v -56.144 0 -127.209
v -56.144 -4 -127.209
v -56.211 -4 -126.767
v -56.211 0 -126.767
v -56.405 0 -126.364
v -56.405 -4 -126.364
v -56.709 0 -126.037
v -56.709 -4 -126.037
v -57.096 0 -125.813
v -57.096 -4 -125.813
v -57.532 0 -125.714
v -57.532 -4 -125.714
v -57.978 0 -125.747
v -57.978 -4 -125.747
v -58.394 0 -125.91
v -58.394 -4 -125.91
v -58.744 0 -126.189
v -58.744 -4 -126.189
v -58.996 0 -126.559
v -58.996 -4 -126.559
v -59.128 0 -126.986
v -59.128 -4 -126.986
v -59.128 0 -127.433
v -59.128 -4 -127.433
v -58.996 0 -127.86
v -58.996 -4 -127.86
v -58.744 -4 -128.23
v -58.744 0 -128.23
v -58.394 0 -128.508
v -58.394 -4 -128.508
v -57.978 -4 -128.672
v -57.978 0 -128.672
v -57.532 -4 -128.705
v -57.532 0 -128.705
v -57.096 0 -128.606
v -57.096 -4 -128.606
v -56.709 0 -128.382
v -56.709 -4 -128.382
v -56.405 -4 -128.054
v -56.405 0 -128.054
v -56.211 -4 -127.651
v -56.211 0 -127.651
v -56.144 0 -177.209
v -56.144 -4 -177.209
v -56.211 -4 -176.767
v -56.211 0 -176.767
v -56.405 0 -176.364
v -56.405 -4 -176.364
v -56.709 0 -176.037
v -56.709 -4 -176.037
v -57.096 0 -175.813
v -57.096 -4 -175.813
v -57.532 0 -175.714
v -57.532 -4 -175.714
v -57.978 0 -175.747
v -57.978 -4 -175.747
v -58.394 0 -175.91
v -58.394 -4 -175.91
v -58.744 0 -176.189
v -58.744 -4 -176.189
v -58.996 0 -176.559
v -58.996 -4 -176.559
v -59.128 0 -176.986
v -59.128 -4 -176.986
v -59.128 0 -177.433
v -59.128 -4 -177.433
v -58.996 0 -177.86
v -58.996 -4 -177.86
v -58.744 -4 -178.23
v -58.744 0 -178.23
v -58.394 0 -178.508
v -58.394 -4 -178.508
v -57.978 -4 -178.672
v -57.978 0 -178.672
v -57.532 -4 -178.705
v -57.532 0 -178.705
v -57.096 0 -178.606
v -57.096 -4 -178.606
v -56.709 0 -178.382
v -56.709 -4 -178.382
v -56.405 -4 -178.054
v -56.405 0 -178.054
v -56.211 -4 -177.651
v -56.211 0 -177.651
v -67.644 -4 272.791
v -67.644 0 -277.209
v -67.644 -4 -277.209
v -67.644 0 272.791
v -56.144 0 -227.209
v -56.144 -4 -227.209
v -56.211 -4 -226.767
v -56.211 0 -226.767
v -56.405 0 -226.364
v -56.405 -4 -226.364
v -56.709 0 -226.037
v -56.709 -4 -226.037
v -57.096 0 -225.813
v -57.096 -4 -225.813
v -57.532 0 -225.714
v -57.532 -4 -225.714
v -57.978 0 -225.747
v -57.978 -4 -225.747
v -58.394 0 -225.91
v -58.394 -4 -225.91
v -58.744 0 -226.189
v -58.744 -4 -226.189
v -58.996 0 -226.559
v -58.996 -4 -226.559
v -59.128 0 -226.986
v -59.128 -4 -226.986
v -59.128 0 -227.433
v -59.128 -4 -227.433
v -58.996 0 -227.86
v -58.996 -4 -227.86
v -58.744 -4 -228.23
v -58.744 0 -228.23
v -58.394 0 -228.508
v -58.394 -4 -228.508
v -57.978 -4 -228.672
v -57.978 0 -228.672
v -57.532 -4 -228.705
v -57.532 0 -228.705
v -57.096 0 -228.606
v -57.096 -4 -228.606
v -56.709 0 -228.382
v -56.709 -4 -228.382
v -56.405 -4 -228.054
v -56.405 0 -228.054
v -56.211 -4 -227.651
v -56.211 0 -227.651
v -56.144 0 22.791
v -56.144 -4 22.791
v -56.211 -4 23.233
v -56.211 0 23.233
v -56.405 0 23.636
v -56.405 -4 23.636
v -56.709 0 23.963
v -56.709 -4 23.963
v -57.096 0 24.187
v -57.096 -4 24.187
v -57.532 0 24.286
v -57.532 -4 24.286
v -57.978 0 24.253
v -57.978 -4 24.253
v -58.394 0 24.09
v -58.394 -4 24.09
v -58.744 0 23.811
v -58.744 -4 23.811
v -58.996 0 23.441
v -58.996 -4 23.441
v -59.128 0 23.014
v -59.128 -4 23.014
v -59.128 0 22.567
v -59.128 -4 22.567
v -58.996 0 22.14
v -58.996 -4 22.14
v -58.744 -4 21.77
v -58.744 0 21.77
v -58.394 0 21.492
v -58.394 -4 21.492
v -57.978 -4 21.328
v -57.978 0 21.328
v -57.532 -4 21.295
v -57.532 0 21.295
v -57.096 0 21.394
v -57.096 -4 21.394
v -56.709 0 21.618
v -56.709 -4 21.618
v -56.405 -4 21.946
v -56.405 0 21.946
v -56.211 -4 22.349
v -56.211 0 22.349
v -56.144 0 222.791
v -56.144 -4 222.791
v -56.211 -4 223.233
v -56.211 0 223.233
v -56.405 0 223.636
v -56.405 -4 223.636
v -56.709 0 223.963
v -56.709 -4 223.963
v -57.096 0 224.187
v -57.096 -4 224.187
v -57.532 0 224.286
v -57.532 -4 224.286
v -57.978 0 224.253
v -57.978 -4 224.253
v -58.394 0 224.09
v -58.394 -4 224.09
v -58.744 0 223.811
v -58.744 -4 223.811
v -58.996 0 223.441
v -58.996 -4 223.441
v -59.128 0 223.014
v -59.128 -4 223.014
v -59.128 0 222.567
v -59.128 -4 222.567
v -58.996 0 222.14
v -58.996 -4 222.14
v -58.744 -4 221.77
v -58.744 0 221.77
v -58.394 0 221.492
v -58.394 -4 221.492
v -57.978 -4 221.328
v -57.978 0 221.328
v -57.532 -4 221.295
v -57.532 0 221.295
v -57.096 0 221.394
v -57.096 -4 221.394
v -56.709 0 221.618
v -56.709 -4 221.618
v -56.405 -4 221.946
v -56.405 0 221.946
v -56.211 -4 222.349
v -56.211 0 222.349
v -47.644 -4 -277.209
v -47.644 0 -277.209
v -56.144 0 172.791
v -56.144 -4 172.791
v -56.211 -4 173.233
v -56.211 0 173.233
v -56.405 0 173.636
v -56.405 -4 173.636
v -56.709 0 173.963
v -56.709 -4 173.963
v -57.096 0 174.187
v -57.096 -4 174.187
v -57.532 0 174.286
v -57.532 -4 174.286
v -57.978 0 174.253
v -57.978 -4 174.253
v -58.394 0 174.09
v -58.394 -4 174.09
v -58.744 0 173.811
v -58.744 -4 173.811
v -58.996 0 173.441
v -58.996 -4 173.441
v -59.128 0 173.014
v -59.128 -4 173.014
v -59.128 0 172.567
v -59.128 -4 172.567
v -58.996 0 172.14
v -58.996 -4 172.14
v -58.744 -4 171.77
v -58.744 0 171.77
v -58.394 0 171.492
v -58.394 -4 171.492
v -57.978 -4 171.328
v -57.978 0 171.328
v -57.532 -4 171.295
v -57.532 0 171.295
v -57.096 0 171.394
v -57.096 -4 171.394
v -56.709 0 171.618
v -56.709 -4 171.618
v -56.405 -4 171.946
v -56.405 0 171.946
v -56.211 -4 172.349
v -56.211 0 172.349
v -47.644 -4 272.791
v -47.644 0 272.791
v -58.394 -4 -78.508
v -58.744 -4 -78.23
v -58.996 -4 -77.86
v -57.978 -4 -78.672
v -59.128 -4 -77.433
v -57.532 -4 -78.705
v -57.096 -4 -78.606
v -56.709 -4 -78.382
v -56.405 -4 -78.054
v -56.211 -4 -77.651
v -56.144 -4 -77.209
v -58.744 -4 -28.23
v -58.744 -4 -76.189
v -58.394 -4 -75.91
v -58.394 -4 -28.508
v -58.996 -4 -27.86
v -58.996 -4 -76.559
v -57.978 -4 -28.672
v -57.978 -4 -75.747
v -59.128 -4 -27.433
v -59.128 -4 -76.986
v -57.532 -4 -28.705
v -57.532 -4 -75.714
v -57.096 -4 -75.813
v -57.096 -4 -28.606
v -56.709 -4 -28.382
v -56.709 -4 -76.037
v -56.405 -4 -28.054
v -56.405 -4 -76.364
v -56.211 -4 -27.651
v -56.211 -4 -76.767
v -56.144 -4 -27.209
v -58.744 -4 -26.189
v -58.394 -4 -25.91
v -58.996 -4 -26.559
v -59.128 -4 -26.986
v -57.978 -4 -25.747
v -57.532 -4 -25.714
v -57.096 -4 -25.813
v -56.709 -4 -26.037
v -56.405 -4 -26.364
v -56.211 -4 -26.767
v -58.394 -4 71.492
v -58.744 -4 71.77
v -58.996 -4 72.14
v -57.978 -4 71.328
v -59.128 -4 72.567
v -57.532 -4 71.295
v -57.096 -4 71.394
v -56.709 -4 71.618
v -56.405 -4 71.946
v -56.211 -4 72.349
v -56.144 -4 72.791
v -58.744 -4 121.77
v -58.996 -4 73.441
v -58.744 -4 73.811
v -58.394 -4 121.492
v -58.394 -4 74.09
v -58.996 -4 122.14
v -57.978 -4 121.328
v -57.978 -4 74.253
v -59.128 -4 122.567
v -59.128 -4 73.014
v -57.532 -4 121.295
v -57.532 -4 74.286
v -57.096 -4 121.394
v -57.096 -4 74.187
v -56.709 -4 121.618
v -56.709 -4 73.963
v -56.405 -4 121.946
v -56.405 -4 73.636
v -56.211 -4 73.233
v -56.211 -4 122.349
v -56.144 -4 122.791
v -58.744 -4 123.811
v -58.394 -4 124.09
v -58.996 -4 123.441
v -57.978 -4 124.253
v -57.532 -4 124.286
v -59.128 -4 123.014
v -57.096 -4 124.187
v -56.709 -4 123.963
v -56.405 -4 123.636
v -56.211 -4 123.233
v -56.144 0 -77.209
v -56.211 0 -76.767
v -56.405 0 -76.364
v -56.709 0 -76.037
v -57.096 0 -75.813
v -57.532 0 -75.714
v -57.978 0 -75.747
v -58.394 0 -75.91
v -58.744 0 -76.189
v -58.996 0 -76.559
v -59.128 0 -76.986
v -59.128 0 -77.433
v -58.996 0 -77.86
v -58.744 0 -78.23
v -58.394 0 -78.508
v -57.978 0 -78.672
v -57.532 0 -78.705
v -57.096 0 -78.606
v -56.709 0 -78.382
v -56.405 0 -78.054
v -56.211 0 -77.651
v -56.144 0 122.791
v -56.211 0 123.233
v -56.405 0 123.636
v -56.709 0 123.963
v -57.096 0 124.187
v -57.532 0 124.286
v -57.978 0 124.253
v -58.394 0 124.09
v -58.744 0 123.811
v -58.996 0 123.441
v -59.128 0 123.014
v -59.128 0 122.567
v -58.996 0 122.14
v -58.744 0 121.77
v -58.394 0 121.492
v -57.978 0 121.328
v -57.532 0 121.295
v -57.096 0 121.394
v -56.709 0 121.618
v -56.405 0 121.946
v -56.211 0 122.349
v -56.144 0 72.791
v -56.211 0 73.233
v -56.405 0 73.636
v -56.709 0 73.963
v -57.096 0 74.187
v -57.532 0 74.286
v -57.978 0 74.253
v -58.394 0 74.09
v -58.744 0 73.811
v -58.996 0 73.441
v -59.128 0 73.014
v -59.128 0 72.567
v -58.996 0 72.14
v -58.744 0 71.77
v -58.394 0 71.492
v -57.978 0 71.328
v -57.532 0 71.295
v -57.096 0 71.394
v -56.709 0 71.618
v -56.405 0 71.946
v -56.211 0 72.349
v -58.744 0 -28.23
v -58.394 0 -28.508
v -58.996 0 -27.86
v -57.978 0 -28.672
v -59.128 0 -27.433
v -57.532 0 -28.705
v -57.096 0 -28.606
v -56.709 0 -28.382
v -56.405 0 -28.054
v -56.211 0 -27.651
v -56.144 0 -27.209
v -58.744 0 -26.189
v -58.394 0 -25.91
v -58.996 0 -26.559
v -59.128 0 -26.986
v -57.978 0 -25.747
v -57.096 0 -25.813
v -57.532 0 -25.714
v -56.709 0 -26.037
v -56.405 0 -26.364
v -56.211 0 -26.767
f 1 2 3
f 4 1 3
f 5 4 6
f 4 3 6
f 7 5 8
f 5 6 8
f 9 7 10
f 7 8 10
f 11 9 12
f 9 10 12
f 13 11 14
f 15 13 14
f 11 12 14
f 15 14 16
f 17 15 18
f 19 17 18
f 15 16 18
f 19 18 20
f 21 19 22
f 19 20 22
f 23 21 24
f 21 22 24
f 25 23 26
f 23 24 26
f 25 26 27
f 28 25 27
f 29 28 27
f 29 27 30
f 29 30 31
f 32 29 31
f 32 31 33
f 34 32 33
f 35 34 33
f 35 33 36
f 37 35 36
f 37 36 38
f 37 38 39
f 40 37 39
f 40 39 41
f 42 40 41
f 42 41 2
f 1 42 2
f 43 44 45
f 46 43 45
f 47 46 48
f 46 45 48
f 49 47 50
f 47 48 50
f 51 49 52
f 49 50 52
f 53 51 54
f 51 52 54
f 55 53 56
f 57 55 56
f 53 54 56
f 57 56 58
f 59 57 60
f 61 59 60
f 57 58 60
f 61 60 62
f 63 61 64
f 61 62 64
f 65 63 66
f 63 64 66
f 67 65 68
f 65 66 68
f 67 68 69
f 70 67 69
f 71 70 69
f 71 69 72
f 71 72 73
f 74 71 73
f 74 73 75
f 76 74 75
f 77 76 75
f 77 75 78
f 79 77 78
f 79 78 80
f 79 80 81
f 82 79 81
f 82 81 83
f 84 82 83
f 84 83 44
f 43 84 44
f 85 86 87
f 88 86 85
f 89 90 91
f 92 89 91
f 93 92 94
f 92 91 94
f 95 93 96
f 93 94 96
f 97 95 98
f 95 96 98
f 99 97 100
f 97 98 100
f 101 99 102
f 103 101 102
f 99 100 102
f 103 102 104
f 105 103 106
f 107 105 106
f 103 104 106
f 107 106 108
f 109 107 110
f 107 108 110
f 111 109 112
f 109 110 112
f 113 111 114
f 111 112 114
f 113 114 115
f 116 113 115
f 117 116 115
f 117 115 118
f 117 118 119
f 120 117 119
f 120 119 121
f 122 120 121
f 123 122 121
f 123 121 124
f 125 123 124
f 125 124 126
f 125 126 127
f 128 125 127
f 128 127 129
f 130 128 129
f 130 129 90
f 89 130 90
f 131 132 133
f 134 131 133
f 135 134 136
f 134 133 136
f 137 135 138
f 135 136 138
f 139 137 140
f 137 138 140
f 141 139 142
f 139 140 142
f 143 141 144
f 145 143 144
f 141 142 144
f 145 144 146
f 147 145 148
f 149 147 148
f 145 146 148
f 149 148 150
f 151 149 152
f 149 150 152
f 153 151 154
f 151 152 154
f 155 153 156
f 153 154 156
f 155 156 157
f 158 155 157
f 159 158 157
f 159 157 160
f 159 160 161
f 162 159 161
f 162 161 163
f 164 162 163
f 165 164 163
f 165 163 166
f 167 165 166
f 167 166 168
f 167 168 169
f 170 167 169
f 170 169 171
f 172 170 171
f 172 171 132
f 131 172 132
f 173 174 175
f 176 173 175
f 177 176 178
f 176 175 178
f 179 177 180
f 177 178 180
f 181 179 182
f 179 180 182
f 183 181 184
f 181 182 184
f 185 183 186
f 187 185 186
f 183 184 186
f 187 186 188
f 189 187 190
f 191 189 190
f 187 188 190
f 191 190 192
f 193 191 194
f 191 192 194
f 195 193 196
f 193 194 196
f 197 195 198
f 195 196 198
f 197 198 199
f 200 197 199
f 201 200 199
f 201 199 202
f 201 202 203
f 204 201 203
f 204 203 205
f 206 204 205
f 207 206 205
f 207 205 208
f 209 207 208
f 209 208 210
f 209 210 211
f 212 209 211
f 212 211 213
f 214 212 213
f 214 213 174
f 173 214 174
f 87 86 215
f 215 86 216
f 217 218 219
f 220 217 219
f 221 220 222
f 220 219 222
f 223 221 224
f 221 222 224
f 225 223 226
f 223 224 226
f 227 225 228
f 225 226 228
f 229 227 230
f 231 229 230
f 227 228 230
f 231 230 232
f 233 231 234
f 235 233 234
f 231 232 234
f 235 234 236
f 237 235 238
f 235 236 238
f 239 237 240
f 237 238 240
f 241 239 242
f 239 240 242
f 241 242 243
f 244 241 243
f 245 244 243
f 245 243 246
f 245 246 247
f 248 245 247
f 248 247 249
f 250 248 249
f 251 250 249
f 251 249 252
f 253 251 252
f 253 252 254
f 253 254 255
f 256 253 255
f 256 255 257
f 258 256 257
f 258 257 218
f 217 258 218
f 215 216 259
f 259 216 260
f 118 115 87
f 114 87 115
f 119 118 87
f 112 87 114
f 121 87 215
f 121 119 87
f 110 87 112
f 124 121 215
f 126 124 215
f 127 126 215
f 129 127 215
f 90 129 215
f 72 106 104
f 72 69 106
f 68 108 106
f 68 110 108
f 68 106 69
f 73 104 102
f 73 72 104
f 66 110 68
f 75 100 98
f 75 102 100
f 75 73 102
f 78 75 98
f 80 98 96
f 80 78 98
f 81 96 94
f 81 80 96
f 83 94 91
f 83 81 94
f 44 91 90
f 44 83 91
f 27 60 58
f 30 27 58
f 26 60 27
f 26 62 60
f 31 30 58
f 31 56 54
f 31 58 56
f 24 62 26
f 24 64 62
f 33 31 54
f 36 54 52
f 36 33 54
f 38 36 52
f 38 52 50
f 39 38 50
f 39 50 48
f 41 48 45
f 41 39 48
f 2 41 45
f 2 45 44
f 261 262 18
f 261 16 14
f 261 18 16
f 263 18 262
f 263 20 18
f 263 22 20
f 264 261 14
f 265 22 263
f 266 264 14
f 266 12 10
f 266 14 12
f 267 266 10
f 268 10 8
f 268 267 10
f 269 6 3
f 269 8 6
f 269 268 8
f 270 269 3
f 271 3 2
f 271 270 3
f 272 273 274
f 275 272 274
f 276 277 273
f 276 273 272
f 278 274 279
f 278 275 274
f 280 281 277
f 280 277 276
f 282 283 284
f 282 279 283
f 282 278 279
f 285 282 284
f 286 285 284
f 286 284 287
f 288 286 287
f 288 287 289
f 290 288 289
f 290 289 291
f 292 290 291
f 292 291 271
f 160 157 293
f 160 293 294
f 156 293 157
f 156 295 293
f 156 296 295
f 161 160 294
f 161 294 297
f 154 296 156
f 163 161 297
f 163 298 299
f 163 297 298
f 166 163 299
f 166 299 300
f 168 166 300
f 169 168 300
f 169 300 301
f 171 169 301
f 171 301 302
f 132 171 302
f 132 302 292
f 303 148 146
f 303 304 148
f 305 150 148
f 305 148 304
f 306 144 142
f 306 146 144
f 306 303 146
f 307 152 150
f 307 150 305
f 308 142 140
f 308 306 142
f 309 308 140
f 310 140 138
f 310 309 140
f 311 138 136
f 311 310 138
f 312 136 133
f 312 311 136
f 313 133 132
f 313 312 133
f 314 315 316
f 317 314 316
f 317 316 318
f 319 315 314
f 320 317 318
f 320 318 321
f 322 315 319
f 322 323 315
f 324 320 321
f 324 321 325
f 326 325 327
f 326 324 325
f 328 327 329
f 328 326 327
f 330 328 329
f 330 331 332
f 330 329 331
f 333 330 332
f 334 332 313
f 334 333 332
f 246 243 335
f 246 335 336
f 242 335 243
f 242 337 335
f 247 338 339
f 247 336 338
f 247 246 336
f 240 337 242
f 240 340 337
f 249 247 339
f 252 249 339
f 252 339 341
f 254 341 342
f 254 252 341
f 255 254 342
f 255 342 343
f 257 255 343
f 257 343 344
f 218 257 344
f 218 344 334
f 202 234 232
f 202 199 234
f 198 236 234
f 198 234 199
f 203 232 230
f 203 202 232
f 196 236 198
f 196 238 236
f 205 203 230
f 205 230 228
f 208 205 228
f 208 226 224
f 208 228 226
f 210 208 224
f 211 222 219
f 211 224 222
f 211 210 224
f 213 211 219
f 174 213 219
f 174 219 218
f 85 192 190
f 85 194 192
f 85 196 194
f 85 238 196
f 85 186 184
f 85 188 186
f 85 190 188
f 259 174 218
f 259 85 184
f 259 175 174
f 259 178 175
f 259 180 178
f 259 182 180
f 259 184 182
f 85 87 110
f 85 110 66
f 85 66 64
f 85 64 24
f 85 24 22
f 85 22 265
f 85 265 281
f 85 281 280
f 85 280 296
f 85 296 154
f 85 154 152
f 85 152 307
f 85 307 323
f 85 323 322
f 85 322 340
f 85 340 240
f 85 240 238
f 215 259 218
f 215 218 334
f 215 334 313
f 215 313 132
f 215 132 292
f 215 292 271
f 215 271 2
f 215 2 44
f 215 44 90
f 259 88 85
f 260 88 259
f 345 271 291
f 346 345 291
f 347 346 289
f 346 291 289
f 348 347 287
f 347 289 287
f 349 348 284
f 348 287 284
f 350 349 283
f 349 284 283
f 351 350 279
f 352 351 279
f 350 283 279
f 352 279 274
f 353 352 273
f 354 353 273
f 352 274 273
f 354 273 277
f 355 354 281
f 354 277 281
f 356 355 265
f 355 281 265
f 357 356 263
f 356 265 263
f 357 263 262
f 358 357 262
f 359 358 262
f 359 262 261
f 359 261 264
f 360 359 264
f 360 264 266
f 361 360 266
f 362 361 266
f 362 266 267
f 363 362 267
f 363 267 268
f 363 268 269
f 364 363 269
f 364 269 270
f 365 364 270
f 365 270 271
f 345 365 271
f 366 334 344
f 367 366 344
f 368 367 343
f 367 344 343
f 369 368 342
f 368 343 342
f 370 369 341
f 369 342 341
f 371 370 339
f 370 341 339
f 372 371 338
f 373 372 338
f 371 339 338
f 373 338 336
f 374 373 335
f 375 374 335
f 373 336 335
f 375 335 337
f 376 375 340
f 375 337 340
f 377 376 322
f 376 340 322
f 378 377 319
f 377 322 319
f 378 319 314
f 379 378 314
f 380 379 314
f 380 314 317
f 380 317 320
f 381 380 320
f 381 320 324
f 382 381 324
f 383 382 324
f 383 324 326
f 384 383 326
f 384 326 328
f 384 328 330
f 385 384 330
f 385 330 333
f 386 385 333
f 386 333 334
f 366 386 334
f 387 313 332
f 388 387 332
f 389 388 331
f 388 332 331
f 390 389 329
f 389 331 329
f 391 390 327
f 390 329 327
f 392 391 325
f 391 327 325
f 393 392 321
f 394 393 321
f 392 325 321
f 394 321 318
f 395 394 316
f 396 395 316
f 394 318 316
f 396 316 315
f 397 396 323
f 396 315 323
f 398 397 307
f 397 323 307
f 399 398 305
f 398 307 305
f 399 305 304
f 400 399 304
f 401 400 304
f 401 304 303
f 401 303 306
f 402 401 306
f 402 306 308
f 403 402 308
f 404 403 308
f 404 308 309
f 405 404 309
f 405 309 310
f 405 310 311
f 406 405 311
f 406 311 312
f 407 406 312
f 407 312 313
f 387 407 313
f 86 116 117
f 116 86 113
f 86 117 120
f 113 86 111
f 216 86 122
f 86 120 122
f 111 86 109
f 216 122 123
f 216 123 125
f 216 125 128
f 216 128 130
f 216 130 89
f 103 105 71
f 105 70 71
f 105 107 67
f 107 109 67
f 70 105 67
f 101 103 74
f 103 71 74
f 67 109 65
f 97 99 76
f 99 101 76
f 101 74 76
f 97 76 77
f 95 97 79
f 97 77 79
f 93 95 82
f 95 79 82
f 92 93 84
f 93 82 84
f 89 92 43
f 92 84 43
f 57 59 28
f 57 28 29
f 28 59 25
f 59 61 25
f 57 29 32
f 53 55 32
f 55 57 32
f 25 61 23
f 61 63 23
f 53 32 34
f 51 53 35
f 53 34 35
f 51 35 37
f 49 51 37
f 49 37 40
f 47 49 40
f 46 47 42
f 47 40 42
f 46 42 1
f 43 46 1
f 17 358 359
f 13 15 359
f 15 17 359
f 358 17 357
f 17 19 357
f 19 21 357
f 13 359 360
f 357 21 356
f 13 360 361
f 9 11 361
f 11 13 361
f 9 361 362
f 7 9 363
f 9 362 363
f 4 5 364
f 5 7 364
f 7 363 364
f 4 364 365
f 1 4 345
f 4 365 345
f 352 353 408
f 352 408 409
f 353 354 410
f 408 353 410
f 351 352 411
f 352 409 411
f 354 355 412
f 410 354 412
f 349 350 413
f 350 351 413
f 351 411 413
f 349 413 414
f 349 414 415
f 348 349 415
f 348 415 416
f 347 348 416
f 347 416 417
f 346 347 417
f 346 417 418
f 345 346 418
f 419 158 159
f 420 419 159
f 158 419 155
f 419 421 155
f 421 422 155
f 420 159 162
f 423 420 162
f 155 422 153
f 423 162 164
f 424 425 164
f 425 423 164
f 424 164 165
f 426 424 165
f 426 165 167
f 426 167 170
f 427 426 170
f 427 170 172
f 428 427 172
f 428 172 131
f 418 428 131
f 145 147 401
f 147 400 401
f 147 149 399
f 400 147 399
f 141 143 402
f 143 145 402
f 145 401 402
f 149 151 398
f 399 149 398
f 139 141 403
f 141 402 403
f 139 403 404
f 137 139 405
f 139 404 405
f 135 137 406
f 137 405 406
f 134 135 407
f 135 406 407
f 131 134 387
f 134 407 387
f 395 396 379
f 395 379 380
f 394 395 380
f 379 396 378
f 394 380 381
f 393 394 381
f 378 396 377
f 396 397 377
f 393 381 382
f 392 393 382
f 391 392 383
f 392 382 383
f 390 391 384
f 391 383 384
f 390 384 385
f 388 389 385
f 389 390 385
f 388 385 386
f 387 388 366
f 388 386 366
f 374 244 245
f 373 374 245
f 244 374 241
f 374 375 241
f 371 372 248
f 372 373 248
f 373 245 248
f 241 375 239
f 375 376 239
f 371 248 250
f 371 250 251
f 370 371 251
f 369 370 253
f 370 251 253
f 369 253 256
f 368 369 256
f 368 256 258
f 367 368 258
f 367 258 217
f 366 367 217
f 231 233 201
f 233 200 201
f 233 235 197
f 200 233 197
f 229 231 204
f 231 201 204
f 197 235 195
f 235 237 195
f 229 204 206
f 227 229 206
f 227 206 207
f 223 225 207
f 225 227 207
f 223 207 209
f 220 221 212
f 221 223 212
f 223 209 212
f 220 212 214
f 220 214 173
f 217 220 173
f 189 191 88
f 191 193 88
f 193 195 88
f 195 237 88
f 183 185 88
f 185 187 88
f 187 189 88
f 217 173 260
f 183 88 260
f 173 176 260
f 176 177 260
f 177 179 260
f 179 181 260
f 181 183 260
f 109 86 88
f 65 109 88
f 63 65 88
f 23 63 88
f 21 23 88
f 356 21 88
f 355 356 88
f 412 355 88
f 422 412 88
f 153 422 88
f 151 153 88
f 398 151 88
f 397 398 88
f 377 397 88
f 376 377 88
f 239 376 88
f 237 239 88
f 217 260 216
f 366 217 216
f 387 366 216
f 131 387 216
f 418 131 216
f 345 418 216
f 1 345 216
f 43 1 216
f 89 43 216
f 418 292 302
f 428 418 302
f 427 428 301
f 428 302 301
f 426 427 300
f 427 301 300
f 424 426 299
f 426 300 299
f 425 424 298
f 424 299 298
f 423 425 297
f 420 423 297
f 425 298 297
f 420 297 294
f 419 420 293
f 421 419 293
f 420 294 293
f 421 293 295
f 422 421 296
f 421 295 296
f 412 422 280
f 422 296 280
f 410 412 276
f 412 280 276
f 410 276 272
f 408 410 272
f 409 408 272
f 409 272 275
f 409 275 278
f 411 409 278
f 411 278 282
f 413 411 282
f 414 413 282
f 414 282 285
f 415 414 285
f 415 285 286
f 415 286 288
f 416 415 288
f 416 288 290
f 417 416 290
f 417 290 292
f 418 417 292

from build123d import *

# Parameters (mm, degrees)
F0_W     = 20
F0_H     = 550
F1_DEPTH = 4
F2_R     = 1.5
F3_DEPTH = 25


with BuildPart() as f1:
    # F0 (on Front) → F1 (new body)
    with BuildSketch(Plane.XZ):
        with Locations((-57.644464, -2.209347)):
            Rectangle(F0_W, F0_H)
    extrude(amount=F1_DEPTH)

    # F2 (on face) → F3 (cut)
    with BuildSketch(Plane.XZ.offset(4)):
        with Locations((-32.644464, 172.790653)):
            Circle(F2_R)
        with Locations((-32.644464, 122.790653)):
            Circle(F2_R)
        with Locations((-57.644464, 122.790653)):
            Circle(F2_R)
        with Locations((-7.644464, 222.790653)):
            Circle(F2_R)
        with Locations((-7.644464, 172.790653)):
            Circle(F2_R)
        with Locations((-7.644464, 122.790653)):
            Circle(F2_R)
        with Locations((-57.644464, 172.790653)):
            Circle(F2_R)
        with Locations((-32.644464, 222.790653)):
            Circle(F2_R)
        with Locations((-57.644464, 222.790653)):
            Circle(F2_R)
        with Locations((-57.644464, -27.209347)):
            Circle(F2_R)
        with Locations((-32.644464, -77.209347)):
            Circle(F2_R)
        with Locations((-57.644464, -127.209347)):
            Circle(F2_R)
        with Locations((-57.644464, -77.209347)):
            Circle(F2_R)
        with Locations((-57.644464, -227.209347)):
            Circle(F2_R)
        with Locations((-57.644464, 72.790653)):
            Circle(F2_R)
        with Locations((-57.644464, 22.790653)):
            Circle(F2_R)
        with Locations((-57.644464, -177.209347)):
            Circle(F2_R)
        with Locations((-32.644464, -27.209347)):
            Circle(F2_R)
        with Locations((-32.644464, 72.790653)):
            Circle(F2_R)
        with Locations((-32.644464, 22.790653)):
            Circle(F2_R)
        with Locations((-32.644464, -127.209347)):
            Circle(F2_R)
        with Locations((-7.644464, -227.209347)):
            Circle(F2_R)
        with Locations((-32.644464, -177.209347)):
            Circle(F2_R)
        with Locations((-7.644464, -177.209347)):
            Circle(F2_R)
        with Locations((-32.644464, -227.209347)):
            Circle(F2_R)
        with Locations((-7.644464, -127.209347)):
            Circle(F2_R)
        with Locations((-7.644464, -77.209347)):
            Circle(F2_R)
        with Locations((-7.644464, -27.209347)):
            Circle(F2_R)
        with Locations((-7.644464, 22.790653)):
            Circle(F2_R)
        with Locations((-7.644464, 72.790653)):
            Circle(F2_R)
    extrude(amount=-F3_DEPTH, mode=Mode.SUBTRACT)


solid = f1.part
